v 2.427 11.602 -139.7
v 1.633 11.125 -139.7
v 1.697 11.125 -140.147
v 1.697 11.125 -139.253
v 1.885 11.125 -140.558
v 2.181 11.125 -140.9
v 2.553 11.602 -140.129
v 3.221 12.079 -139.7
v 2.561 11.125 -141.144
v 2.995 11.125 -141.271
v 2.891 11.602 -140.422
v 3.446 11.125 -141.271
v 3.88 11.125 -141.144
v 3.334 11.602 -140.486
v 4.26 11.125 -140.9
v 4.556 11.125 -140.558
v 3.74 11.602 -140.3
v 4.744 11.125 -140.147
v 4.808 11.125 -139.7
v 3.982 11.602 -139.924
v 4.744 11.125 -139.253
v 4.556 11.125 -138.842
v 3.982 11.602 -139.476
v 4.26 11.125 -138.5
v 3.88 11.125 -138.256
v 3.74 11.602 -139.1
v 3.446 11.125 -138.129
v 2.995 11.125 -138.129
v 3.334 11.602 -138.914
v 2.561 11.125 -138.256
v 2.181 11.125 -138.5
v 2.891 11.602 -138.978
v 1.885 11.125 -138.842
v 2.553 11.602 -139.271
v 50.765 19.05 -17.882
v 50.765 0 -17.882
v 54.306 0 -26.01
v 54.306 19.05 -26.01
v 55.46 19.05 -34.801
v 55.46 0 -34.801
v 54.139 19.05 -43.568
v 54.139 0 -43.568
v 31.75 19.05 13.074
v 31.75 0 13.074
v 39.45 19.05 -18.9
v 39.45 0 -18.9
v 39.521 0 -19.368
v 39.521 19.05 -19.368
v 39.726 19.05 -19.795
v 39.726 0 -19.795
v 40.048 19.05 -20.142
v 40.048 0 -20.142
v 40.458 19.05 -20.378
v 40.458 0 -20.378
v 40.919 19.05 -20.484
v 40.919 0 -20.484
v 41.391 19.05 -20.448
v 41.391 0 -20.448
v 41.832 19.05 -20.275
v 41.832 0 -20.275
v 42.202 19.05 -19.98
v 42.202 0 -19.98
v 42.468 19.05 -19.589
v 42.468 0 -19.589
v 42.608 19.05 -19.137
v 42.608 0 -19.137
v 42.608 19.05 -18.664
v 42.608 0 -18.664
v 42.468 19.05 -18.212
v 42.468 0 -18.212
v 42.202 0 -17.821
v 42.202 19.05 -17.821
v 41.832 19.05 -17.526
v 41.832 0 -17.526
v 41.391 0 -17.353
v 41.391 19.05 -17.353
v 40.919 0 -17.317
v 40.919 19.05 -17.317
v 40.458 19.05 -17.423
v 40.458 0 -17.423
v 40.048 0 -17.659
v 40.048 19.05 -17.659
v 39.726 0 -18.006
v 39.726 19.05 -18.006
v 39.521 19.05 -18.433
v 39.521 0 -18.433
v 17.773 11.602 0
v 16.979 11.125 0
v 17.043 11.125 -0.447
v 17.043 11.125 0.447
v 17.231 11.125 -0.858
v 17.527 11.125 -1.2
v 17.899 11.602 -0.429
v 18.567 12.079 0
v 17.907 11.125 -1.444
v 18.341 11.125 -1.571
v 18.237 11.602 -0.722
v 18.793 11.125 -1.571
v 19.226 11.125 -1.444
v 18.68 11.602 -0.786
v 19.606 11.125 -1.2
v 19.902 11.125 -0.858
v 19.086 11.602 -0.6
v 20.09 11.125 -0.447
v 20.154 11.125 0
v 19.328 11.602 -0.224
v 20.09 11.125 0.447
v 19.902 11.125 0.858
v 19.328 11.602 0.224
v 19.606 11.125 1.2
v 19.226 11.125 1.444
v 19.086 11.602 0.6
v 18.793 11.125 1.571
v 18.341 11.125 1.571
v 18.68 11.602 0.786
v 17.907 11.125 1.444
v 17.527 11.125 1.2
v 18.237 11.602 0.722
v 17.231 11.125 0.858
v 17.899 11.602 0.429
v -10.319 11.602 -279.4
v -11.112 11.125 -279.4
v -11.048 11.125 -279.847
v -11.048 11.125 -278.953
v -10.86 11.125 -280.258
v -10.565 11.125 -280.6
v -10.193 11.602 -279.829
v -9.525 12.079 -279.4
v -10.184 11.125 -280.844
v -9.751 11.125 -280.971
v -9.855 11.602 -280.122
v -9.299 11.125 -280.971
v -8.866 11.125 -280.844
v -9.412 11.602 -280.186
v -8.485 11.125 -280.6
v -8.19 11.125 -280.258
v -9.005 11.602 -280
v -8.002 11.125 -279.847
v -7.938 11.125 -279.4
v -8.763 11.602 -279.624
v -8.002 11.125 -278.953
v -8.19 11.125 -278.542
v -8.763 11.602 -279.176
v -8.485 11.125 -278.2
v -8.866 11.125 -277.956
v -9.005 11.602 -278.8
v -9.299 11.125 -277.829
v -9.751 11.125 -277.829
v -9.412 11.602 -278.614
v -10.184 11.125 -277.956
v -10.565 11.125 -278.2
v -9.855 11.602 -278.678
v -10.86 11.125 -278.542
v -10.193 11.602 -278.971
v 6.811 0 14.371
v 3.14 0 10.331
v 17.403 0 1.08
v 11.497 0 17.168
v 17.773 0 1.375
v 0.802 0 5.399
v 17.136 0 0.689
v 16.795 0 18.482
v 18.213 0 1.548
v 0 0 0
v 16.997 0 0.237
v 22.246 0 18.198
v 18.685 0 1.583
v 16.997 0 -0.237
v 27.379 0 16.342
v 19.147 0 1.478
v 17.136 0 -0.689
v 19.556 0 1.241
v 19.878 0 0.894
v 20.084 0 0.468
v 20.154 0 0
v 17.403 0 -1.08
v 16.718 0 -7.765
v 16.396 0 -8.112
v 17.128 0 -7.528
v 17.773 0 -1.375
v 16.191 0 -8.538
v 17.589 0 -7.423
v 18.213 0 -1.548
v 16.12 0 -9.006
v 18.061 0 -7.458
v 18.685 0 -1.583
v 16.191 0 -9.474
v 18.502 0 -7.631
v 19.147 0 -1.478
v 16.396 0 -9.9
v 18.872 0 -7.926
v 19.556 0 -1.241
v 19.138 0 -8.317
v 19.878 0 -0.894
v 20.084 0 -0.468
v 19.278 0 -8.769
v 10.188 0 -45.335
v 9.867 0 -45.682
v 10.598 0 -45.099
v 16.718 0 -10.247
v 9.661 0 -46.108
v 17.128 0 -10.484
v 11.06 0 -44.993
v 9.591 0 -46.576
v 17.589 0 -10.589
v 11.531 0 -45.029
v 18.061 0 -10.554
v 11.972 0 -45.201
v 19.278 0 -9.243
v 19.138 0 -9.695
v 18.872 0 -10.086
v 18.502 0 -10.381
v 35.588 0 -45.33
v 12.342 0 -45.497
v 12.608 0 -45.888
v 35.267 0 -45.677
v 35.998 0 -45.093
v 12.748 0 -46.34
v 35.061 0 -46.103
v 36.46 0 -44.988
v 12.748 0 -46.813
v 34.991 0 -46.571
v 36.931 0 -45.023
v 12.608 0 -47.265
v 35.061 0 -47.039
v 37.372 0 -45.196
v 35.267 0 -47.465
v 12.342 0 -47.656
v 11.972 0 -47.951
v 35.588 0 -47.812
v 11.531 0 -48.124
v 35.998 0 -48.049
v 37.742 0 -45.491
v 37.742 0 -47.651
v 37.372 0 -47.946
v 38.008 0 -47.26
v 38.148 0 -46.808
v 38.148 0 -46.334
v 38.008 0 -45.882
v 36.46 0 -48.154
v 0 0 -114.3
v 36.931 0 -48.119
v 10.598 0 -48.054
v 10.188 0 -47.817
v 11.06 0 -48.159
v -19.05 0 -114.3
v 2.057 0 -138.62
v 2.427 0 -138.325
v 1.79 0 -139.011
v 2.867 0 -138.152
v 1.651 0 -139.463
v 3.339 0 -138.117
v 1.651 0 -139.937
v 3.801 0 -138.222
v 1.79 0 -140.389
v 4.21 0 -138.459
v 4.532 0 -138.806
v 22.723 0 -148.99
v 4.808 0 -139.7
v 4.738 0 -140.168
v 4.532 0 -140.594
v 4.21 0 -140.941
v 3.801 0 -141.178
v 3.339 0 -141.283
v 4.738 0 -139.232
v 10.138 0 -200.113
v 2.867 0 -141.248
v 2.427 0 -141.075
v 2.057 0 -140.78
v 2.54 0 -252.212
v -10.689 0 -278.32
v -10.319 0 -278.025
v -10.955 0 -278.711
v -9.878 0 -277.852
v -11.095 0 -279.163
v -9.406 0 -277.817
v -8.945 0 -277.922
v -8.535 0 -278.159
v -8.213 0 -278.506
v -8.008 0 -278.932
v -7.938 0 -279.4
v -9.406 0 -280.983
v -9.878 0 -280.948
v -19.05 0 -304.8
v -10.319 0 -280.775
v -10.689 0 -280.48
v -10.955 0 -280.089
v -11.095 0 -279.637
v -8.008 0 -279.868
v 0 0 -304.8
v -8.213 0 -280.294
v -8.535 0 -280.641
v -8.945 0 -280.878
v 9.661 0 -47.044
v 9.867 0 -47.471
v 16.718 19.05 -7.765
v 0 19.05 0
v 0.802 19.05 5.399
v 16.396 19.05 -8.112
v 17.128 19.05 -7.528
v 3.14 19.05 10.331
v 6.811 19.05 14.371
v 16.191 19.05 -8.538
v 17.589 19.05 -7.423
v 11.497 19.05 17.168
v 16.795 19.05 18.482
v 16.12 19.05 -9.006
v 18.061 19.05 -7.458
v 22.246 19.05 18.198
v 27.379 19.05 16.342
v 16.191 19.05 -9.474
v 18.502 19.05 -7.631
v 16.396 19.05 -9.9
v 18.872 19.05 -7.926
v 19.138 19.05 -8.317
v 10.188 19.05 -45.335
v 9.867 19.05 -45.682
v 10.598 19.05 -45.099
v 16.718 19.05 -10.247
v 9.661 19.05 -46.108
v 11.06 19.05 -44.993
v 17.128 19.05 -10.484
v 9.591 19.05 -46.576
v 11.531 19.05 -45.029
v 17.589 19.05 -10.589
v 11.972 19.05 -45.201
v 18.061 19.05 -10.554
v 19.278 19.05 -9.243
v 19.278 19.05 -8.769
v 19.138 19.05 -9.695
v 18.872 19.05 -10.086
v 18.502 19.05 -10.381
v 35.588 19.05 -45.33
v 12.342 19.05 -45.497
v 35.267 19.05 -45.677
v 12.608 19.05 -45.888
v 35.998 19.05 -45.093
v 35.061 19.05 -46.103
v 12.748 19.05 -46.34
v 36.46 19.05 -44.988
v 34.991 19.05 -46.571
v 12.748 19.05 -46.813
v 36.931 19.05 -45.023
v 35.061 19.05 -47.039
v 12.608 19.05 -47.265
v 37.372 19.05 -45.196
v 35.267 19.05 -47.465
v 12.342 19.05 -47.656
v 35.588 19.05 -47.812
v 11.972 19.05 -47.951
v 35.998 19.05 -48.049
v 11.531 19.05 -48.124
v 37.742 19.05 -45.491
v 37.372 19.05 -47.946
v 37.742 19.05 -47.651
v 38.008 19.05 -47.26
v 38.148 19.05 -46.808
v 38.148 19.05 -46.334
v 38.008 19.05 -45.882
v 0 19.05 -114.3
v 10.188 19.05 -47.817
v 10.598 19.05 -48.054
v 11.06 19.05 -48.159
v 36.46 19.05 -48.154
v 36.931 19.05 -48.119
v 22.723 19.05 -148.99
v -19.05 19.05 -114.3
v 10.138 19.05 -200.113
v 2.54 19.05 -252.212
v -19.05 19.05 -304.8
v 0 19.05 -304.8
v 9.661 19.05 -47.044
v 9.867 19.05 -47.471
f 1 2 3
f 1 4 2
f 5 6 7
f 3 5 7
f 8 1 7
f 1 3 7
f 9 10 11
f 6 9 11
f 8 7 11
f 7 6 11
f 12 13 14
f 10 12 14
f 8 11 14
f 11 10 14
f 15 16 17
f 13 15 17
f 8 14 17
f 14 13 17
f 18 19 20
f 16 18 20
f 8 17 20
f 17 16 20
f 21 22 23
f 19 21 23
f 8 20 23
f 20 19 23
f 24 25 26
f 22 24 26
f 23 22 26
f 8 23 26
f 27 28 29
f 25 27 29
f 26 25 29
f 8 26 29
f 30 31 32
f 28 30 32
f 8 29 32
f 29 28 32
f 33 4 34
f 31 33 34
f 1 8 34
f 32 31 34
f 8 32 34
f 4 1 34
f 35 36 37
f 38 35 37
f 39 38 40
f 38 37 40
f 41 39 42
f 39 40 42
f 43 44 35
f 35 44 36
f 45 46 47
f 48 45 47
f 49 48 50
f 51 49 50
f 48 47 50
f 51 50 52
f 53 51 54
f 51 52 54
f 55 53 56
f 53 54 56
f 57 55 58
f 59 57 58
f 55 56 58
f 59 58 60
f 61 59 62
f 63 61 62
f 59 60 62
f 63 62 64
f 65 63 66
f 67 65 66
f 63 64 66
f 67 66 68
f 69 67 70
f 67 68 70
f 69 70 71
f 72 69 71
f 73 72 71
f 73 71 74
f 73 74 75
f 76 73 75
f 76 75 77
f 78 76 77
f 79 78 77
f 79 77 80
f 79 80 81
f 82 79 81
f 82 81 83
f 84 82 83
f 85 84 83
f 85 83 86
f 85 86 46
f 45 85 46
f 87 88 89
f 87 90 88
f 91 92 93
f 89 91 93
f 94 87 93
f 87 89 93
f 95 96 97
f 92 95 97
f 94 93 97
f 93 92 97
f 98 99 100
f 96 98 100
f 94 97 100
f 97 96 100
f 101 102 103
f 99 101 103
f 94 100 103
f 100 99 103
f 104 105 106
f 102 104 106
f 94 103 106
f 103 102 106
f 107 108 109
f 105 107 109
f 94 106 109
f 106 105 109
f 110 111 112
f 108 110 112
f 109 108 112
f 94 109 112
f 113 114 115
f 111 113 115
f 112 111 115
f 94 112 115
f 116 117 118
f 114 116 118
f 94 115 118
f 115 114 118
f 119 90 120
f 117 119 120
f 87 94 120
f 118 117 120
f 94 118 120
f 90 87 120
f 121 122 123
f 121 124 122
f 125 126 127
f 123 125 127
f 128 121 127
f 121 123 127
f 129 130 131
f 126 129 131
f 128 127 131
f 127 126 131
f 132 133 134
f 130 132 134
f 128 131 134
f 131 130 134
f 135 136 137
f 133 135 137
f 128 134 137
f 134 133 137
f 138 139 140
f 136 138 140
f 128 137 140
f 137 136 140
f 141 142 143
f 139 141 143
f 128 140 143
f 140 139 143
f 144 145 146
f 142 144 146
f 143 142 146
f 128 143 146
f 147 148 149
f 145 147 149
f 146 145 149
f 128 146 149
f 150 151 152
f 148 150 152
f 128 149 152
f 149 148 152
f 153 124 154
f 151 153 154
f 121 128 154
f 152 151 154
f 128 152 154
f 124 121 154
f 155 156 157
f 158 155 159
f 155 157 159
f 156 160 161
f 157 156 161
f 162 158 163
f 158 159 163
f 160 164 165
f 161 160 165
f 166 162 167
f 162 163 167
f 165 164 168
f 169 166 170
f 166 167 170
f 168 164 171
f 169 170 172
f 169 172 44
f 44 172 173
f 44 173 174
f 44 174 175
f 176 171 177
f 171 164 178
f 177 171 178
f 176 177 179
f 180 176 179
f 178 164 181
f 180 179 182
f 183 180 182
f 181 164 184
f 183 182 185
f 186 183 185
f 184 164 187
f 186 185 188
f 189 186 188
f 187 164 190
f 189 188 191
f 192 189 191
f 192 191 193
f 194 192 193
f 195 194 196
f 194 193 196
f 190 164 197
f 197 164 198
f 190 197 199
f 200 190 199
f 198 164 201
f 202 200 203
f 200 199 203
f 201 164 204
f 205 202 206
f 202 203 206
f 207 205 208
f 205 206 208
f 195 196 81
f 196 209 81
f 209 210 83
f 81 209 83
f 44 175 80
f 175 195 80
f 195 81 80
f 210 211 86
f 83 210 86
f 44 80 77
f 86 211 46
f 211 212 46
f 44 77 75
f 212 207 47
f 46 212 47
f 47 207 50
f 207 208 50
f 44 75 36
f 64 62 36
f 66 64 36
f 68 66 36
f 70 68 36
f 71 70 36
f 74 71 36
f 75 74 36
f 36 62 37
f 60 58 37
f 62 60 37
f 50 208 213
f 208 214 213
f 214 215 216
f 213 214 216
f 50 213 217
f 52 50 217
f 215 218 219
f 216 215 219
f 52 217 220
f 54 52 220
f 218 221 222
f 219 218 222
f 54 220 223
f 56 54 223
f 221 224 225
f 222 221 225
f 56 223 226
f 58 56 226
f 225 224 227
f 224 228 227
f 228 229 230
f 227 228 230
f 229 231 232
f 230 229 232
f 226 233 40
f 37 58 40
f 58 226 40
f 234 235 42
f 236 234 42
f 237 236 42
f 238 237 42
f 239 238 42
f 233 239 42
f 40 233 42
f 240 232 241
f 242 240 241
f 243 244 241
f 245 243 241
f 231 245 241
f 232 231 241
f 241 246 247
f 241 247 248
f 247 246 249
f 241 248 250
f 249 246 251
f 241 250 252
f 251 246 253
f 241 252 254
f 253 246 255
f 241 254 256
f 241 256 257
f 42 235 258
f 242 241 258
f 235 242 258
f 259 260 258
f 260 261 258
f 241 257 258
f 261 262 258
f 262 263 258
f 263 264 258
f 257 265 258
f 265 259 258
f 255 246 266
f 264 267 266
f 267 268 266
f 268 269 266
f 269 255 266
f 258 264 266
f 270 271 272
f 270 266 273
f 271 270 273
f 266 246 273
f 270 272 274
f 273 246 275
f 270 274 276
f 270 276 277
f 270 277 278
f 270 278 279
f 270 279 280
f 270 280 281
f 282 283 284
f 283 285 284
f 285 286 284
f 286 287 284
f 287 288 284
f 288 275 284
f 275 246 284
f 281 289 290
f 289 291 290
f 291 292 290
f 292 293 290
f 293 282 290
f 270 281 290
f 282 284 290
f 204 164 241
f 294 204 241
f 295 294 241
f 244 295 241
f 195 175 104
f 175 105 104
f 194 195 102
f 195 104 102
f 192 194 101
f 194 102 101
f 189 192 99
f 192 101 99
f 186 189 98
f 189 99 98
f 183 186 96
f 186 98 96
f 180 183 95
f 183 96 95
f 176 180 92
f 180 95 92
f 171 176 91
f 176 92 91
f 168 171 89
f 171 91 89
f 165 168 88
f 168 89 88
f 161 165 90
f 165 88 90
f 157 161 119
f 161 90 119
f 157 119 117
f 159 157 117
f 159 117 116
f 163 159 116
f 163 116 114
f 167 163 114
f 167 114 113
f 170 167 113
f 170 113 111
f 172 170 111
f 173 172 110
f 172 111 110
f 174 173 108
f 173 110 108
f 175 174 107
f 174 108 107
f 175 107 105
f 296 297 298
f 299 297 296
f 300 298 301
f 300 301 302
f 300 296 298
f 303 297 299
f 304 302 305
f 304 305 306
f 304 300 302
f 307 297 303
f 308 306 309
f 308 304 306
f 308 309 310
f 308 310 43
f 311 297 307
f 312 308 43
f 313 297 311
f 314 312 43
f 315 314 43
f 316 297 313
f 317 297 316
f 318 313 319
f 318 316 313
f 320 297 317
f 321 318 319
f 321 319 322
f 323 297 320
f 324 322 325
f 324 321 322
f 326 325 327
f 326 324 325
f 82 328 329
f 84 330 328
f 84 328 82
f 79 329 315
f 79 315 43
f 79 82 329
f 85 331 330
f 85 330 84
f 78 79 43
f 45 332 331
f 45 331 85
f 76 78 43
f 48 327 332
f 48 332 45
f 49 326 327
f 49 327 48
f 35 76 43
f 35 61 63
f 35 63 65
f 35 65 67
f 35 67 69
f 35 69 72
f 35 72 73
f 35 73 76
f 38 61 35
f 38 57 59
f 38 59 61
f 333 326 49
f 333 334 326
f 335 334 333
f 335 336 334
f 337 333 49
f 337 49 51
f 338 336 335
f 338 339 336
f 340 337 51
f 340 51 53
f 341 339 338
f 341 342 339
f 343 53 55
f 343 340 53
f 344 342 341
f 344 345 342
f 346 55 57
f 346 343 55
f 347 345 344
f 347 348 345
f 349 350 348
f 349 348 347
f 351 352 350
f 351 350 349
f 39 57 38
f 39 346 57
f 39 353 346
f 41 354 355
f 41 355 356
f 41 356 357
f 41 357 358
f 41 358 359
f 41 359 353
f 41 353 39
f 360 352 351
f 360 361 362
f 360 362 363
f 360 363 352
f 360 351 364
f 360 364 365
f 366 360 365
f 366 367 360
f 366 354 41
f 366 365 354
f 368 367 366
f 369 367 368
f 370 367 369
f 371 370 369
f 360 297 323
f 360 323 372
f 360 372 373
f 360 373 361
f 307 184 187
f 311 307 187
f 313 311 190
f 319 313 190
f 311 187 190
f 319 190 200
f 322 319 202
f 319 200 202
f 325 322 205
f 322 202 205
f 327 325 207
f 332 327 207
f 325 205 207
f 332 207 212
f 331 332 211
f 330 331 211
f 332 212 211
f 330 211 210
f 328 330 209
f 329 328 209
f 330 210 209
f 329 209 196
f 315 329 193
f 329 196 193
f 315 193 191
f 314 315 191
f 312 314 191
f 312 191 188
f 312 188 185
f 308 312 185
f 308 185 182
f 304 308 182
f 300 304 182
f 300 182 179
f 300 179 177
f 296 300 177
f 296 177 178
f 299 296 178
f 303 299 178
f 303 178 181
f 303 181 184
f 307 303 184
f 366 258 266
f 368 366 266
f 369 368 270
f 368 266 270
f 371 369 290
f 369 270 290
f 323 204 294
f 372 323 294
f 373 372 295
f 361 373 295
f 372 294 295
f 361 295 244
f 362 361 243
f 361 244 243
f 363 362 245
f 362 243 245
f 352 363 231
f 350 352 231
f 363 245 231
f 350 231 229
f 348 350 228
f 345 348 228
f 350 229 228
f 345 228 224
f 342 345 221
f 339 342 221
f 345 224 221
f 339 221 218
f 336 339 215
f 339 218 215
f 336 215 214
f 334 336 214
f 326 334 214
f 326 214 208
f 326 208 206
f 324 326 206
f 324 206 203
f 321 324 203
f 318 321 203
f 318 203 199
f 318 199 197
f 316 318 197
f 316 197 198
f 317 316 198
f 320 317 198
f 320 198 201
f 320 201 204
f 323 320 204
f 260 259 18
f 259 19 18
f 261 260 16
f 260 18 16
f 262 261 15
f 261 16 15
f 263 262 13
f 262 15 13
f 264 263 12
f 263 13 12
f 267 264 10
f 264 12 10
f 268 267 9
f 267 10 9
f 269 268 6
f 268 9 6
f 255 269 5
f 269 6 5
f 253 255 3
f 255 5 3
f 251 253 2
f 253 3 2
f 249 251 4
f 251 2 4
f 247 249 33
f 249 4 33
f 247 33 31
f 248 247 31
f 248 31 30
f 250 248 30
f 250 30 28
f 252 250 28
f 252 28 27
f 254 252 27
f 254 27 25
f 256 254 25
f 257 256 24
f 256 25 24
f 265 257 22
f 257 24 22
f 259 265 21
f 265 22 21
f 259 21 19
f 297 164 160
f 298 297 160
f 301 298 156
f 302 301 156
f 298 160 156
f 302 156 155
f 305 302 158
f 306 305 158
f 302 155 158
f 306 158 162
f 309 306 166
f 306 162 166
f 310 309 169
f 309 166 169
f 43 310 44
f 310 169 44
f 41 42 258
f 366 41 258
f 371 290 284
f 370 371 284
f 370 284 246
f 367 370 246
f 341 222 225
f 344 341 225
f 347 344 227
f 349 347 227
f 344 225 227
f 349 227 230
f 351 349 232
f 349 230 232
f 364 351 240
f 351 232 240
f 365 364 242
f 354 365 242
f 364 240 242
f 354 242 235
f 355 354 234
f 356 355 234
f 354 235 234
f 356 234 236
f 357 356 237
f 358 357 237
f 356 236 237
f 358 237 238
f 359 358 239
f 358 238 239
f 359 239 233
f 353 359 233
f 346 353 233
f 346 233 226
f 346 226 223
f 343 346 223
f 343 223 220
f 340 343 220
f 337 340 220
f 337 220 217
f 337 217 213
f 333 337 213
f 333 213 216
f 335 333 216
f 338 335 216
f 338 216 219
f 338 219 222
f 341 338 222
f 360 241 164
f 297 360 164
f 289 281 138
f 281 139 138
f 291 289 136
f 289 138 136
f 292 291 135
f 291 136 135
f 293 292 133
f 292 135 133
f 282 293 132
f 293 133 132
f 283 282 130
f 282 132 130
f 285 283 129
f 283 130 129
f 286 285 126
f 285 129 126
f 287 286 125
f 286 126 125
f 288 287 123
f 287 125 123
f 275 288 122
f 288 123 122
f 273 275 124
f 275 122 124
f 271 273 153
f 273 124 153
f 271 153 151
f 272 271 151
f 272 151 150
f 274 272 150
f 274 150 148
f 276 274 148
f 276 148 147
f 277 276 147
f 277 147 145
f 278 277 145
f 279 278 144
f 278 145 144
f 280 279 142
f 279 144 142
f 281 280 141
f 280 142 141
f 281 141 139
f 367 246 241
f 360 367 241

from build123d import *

# Parameters (mm, degrees)
BOSS_EXTRUDE1_DEPTH              = 19.05
F_1_8_0_125_DIAMETER_HOLE1_D     = 3.175
F_1_8_0_125_DIAMETER_HOLE1_DEPTH = 11.1252
F_1_8_0_125_DIAMETER_HOLE1_TIP   = 0.953866233
F_1_8_0_125_DIAMETER_HOLE2_D     = 3.175


with BuildPart() as part:
    # Sketch1 → Boss-Extrude1 (new body)
    with BuildSketch(Plane(origin=(0, 0, 0), x_dir=(1, 0, 0), z_dir=(0, 1, 0))):
        with BuildLine():
            Line((31.75, -13.073529412), (50.765202328, 17.881902266))
            ThreePointArc((50.765202328, 17.881902266), (55.191250928, 30.365130488), (54.139291827, 43.567943639))
            Line((54.139291827, 43.567943639), (22.722603429, 148.989996692))
            ThreePointArc((22.722603429, 148.989996692), (5.710537817, 226.070917322), (0, 304.8))
            Line((0, 304.8), (-19.05, 304.8))
            Line((-19.05, 304.8), (-19.05, 114.3))
            Line((-19.05, 114.3), (0, 114.3))
            Line((0, 114.3), (0, 0))
            ThreePointArc((0, 0), (11.497376237, -17.168136702), (31.75, -13.073529412))
        make_face()
    extrude(amount=BOSS_EXTRUDE1_DEPTH)

    # 1/8 (0.125) Diameter Hole1
    with Locations(Plane(origin=(0, 0, 0), x_dir=(-1, 0, 0), z_dir=(0, -1, 0))):
        with Locations((-3.220551607, 139.7), (-18.566608997, 0), (9.525, 279.4)):
            Hole(F_1_8_0_125_DIAMETER_HOLE1_D / 2, depth=F_1_8_0_125_DIAMETER_HOLE1_DEPTH)
            with Locations((0, 0, -(F_1_8_0_125_DIAMETER_HOLE1_DEPTH + F_1_8_0_125_DIAMETER_HOLE1_TIP / 2))):  # 118° drill point
                Cone(0, F_1_8_0_125_DIAMETER_HOLE1_D / 2, F_1_8_0_125_DIAMETER_HOLE1_TIP, mode=Mode.SUBTRACT)

    # 1/8 (0.125) Diameter Hole2 (through all)
    with Locations(Plane(origin=(0, 19.05, 0), x_dir=(1, 0, 0), z_dir=(0, 1, 0))):
        with Locations((36.578180871, 46.570899758), (11.178180871, 46.576310918), (17.707917982, 9.005992113), (41.037990009, 18.900486467)):
            Hole(F_1_8_0_125_DIAMETER_HOLE2_D / 2)


solid = part.part
